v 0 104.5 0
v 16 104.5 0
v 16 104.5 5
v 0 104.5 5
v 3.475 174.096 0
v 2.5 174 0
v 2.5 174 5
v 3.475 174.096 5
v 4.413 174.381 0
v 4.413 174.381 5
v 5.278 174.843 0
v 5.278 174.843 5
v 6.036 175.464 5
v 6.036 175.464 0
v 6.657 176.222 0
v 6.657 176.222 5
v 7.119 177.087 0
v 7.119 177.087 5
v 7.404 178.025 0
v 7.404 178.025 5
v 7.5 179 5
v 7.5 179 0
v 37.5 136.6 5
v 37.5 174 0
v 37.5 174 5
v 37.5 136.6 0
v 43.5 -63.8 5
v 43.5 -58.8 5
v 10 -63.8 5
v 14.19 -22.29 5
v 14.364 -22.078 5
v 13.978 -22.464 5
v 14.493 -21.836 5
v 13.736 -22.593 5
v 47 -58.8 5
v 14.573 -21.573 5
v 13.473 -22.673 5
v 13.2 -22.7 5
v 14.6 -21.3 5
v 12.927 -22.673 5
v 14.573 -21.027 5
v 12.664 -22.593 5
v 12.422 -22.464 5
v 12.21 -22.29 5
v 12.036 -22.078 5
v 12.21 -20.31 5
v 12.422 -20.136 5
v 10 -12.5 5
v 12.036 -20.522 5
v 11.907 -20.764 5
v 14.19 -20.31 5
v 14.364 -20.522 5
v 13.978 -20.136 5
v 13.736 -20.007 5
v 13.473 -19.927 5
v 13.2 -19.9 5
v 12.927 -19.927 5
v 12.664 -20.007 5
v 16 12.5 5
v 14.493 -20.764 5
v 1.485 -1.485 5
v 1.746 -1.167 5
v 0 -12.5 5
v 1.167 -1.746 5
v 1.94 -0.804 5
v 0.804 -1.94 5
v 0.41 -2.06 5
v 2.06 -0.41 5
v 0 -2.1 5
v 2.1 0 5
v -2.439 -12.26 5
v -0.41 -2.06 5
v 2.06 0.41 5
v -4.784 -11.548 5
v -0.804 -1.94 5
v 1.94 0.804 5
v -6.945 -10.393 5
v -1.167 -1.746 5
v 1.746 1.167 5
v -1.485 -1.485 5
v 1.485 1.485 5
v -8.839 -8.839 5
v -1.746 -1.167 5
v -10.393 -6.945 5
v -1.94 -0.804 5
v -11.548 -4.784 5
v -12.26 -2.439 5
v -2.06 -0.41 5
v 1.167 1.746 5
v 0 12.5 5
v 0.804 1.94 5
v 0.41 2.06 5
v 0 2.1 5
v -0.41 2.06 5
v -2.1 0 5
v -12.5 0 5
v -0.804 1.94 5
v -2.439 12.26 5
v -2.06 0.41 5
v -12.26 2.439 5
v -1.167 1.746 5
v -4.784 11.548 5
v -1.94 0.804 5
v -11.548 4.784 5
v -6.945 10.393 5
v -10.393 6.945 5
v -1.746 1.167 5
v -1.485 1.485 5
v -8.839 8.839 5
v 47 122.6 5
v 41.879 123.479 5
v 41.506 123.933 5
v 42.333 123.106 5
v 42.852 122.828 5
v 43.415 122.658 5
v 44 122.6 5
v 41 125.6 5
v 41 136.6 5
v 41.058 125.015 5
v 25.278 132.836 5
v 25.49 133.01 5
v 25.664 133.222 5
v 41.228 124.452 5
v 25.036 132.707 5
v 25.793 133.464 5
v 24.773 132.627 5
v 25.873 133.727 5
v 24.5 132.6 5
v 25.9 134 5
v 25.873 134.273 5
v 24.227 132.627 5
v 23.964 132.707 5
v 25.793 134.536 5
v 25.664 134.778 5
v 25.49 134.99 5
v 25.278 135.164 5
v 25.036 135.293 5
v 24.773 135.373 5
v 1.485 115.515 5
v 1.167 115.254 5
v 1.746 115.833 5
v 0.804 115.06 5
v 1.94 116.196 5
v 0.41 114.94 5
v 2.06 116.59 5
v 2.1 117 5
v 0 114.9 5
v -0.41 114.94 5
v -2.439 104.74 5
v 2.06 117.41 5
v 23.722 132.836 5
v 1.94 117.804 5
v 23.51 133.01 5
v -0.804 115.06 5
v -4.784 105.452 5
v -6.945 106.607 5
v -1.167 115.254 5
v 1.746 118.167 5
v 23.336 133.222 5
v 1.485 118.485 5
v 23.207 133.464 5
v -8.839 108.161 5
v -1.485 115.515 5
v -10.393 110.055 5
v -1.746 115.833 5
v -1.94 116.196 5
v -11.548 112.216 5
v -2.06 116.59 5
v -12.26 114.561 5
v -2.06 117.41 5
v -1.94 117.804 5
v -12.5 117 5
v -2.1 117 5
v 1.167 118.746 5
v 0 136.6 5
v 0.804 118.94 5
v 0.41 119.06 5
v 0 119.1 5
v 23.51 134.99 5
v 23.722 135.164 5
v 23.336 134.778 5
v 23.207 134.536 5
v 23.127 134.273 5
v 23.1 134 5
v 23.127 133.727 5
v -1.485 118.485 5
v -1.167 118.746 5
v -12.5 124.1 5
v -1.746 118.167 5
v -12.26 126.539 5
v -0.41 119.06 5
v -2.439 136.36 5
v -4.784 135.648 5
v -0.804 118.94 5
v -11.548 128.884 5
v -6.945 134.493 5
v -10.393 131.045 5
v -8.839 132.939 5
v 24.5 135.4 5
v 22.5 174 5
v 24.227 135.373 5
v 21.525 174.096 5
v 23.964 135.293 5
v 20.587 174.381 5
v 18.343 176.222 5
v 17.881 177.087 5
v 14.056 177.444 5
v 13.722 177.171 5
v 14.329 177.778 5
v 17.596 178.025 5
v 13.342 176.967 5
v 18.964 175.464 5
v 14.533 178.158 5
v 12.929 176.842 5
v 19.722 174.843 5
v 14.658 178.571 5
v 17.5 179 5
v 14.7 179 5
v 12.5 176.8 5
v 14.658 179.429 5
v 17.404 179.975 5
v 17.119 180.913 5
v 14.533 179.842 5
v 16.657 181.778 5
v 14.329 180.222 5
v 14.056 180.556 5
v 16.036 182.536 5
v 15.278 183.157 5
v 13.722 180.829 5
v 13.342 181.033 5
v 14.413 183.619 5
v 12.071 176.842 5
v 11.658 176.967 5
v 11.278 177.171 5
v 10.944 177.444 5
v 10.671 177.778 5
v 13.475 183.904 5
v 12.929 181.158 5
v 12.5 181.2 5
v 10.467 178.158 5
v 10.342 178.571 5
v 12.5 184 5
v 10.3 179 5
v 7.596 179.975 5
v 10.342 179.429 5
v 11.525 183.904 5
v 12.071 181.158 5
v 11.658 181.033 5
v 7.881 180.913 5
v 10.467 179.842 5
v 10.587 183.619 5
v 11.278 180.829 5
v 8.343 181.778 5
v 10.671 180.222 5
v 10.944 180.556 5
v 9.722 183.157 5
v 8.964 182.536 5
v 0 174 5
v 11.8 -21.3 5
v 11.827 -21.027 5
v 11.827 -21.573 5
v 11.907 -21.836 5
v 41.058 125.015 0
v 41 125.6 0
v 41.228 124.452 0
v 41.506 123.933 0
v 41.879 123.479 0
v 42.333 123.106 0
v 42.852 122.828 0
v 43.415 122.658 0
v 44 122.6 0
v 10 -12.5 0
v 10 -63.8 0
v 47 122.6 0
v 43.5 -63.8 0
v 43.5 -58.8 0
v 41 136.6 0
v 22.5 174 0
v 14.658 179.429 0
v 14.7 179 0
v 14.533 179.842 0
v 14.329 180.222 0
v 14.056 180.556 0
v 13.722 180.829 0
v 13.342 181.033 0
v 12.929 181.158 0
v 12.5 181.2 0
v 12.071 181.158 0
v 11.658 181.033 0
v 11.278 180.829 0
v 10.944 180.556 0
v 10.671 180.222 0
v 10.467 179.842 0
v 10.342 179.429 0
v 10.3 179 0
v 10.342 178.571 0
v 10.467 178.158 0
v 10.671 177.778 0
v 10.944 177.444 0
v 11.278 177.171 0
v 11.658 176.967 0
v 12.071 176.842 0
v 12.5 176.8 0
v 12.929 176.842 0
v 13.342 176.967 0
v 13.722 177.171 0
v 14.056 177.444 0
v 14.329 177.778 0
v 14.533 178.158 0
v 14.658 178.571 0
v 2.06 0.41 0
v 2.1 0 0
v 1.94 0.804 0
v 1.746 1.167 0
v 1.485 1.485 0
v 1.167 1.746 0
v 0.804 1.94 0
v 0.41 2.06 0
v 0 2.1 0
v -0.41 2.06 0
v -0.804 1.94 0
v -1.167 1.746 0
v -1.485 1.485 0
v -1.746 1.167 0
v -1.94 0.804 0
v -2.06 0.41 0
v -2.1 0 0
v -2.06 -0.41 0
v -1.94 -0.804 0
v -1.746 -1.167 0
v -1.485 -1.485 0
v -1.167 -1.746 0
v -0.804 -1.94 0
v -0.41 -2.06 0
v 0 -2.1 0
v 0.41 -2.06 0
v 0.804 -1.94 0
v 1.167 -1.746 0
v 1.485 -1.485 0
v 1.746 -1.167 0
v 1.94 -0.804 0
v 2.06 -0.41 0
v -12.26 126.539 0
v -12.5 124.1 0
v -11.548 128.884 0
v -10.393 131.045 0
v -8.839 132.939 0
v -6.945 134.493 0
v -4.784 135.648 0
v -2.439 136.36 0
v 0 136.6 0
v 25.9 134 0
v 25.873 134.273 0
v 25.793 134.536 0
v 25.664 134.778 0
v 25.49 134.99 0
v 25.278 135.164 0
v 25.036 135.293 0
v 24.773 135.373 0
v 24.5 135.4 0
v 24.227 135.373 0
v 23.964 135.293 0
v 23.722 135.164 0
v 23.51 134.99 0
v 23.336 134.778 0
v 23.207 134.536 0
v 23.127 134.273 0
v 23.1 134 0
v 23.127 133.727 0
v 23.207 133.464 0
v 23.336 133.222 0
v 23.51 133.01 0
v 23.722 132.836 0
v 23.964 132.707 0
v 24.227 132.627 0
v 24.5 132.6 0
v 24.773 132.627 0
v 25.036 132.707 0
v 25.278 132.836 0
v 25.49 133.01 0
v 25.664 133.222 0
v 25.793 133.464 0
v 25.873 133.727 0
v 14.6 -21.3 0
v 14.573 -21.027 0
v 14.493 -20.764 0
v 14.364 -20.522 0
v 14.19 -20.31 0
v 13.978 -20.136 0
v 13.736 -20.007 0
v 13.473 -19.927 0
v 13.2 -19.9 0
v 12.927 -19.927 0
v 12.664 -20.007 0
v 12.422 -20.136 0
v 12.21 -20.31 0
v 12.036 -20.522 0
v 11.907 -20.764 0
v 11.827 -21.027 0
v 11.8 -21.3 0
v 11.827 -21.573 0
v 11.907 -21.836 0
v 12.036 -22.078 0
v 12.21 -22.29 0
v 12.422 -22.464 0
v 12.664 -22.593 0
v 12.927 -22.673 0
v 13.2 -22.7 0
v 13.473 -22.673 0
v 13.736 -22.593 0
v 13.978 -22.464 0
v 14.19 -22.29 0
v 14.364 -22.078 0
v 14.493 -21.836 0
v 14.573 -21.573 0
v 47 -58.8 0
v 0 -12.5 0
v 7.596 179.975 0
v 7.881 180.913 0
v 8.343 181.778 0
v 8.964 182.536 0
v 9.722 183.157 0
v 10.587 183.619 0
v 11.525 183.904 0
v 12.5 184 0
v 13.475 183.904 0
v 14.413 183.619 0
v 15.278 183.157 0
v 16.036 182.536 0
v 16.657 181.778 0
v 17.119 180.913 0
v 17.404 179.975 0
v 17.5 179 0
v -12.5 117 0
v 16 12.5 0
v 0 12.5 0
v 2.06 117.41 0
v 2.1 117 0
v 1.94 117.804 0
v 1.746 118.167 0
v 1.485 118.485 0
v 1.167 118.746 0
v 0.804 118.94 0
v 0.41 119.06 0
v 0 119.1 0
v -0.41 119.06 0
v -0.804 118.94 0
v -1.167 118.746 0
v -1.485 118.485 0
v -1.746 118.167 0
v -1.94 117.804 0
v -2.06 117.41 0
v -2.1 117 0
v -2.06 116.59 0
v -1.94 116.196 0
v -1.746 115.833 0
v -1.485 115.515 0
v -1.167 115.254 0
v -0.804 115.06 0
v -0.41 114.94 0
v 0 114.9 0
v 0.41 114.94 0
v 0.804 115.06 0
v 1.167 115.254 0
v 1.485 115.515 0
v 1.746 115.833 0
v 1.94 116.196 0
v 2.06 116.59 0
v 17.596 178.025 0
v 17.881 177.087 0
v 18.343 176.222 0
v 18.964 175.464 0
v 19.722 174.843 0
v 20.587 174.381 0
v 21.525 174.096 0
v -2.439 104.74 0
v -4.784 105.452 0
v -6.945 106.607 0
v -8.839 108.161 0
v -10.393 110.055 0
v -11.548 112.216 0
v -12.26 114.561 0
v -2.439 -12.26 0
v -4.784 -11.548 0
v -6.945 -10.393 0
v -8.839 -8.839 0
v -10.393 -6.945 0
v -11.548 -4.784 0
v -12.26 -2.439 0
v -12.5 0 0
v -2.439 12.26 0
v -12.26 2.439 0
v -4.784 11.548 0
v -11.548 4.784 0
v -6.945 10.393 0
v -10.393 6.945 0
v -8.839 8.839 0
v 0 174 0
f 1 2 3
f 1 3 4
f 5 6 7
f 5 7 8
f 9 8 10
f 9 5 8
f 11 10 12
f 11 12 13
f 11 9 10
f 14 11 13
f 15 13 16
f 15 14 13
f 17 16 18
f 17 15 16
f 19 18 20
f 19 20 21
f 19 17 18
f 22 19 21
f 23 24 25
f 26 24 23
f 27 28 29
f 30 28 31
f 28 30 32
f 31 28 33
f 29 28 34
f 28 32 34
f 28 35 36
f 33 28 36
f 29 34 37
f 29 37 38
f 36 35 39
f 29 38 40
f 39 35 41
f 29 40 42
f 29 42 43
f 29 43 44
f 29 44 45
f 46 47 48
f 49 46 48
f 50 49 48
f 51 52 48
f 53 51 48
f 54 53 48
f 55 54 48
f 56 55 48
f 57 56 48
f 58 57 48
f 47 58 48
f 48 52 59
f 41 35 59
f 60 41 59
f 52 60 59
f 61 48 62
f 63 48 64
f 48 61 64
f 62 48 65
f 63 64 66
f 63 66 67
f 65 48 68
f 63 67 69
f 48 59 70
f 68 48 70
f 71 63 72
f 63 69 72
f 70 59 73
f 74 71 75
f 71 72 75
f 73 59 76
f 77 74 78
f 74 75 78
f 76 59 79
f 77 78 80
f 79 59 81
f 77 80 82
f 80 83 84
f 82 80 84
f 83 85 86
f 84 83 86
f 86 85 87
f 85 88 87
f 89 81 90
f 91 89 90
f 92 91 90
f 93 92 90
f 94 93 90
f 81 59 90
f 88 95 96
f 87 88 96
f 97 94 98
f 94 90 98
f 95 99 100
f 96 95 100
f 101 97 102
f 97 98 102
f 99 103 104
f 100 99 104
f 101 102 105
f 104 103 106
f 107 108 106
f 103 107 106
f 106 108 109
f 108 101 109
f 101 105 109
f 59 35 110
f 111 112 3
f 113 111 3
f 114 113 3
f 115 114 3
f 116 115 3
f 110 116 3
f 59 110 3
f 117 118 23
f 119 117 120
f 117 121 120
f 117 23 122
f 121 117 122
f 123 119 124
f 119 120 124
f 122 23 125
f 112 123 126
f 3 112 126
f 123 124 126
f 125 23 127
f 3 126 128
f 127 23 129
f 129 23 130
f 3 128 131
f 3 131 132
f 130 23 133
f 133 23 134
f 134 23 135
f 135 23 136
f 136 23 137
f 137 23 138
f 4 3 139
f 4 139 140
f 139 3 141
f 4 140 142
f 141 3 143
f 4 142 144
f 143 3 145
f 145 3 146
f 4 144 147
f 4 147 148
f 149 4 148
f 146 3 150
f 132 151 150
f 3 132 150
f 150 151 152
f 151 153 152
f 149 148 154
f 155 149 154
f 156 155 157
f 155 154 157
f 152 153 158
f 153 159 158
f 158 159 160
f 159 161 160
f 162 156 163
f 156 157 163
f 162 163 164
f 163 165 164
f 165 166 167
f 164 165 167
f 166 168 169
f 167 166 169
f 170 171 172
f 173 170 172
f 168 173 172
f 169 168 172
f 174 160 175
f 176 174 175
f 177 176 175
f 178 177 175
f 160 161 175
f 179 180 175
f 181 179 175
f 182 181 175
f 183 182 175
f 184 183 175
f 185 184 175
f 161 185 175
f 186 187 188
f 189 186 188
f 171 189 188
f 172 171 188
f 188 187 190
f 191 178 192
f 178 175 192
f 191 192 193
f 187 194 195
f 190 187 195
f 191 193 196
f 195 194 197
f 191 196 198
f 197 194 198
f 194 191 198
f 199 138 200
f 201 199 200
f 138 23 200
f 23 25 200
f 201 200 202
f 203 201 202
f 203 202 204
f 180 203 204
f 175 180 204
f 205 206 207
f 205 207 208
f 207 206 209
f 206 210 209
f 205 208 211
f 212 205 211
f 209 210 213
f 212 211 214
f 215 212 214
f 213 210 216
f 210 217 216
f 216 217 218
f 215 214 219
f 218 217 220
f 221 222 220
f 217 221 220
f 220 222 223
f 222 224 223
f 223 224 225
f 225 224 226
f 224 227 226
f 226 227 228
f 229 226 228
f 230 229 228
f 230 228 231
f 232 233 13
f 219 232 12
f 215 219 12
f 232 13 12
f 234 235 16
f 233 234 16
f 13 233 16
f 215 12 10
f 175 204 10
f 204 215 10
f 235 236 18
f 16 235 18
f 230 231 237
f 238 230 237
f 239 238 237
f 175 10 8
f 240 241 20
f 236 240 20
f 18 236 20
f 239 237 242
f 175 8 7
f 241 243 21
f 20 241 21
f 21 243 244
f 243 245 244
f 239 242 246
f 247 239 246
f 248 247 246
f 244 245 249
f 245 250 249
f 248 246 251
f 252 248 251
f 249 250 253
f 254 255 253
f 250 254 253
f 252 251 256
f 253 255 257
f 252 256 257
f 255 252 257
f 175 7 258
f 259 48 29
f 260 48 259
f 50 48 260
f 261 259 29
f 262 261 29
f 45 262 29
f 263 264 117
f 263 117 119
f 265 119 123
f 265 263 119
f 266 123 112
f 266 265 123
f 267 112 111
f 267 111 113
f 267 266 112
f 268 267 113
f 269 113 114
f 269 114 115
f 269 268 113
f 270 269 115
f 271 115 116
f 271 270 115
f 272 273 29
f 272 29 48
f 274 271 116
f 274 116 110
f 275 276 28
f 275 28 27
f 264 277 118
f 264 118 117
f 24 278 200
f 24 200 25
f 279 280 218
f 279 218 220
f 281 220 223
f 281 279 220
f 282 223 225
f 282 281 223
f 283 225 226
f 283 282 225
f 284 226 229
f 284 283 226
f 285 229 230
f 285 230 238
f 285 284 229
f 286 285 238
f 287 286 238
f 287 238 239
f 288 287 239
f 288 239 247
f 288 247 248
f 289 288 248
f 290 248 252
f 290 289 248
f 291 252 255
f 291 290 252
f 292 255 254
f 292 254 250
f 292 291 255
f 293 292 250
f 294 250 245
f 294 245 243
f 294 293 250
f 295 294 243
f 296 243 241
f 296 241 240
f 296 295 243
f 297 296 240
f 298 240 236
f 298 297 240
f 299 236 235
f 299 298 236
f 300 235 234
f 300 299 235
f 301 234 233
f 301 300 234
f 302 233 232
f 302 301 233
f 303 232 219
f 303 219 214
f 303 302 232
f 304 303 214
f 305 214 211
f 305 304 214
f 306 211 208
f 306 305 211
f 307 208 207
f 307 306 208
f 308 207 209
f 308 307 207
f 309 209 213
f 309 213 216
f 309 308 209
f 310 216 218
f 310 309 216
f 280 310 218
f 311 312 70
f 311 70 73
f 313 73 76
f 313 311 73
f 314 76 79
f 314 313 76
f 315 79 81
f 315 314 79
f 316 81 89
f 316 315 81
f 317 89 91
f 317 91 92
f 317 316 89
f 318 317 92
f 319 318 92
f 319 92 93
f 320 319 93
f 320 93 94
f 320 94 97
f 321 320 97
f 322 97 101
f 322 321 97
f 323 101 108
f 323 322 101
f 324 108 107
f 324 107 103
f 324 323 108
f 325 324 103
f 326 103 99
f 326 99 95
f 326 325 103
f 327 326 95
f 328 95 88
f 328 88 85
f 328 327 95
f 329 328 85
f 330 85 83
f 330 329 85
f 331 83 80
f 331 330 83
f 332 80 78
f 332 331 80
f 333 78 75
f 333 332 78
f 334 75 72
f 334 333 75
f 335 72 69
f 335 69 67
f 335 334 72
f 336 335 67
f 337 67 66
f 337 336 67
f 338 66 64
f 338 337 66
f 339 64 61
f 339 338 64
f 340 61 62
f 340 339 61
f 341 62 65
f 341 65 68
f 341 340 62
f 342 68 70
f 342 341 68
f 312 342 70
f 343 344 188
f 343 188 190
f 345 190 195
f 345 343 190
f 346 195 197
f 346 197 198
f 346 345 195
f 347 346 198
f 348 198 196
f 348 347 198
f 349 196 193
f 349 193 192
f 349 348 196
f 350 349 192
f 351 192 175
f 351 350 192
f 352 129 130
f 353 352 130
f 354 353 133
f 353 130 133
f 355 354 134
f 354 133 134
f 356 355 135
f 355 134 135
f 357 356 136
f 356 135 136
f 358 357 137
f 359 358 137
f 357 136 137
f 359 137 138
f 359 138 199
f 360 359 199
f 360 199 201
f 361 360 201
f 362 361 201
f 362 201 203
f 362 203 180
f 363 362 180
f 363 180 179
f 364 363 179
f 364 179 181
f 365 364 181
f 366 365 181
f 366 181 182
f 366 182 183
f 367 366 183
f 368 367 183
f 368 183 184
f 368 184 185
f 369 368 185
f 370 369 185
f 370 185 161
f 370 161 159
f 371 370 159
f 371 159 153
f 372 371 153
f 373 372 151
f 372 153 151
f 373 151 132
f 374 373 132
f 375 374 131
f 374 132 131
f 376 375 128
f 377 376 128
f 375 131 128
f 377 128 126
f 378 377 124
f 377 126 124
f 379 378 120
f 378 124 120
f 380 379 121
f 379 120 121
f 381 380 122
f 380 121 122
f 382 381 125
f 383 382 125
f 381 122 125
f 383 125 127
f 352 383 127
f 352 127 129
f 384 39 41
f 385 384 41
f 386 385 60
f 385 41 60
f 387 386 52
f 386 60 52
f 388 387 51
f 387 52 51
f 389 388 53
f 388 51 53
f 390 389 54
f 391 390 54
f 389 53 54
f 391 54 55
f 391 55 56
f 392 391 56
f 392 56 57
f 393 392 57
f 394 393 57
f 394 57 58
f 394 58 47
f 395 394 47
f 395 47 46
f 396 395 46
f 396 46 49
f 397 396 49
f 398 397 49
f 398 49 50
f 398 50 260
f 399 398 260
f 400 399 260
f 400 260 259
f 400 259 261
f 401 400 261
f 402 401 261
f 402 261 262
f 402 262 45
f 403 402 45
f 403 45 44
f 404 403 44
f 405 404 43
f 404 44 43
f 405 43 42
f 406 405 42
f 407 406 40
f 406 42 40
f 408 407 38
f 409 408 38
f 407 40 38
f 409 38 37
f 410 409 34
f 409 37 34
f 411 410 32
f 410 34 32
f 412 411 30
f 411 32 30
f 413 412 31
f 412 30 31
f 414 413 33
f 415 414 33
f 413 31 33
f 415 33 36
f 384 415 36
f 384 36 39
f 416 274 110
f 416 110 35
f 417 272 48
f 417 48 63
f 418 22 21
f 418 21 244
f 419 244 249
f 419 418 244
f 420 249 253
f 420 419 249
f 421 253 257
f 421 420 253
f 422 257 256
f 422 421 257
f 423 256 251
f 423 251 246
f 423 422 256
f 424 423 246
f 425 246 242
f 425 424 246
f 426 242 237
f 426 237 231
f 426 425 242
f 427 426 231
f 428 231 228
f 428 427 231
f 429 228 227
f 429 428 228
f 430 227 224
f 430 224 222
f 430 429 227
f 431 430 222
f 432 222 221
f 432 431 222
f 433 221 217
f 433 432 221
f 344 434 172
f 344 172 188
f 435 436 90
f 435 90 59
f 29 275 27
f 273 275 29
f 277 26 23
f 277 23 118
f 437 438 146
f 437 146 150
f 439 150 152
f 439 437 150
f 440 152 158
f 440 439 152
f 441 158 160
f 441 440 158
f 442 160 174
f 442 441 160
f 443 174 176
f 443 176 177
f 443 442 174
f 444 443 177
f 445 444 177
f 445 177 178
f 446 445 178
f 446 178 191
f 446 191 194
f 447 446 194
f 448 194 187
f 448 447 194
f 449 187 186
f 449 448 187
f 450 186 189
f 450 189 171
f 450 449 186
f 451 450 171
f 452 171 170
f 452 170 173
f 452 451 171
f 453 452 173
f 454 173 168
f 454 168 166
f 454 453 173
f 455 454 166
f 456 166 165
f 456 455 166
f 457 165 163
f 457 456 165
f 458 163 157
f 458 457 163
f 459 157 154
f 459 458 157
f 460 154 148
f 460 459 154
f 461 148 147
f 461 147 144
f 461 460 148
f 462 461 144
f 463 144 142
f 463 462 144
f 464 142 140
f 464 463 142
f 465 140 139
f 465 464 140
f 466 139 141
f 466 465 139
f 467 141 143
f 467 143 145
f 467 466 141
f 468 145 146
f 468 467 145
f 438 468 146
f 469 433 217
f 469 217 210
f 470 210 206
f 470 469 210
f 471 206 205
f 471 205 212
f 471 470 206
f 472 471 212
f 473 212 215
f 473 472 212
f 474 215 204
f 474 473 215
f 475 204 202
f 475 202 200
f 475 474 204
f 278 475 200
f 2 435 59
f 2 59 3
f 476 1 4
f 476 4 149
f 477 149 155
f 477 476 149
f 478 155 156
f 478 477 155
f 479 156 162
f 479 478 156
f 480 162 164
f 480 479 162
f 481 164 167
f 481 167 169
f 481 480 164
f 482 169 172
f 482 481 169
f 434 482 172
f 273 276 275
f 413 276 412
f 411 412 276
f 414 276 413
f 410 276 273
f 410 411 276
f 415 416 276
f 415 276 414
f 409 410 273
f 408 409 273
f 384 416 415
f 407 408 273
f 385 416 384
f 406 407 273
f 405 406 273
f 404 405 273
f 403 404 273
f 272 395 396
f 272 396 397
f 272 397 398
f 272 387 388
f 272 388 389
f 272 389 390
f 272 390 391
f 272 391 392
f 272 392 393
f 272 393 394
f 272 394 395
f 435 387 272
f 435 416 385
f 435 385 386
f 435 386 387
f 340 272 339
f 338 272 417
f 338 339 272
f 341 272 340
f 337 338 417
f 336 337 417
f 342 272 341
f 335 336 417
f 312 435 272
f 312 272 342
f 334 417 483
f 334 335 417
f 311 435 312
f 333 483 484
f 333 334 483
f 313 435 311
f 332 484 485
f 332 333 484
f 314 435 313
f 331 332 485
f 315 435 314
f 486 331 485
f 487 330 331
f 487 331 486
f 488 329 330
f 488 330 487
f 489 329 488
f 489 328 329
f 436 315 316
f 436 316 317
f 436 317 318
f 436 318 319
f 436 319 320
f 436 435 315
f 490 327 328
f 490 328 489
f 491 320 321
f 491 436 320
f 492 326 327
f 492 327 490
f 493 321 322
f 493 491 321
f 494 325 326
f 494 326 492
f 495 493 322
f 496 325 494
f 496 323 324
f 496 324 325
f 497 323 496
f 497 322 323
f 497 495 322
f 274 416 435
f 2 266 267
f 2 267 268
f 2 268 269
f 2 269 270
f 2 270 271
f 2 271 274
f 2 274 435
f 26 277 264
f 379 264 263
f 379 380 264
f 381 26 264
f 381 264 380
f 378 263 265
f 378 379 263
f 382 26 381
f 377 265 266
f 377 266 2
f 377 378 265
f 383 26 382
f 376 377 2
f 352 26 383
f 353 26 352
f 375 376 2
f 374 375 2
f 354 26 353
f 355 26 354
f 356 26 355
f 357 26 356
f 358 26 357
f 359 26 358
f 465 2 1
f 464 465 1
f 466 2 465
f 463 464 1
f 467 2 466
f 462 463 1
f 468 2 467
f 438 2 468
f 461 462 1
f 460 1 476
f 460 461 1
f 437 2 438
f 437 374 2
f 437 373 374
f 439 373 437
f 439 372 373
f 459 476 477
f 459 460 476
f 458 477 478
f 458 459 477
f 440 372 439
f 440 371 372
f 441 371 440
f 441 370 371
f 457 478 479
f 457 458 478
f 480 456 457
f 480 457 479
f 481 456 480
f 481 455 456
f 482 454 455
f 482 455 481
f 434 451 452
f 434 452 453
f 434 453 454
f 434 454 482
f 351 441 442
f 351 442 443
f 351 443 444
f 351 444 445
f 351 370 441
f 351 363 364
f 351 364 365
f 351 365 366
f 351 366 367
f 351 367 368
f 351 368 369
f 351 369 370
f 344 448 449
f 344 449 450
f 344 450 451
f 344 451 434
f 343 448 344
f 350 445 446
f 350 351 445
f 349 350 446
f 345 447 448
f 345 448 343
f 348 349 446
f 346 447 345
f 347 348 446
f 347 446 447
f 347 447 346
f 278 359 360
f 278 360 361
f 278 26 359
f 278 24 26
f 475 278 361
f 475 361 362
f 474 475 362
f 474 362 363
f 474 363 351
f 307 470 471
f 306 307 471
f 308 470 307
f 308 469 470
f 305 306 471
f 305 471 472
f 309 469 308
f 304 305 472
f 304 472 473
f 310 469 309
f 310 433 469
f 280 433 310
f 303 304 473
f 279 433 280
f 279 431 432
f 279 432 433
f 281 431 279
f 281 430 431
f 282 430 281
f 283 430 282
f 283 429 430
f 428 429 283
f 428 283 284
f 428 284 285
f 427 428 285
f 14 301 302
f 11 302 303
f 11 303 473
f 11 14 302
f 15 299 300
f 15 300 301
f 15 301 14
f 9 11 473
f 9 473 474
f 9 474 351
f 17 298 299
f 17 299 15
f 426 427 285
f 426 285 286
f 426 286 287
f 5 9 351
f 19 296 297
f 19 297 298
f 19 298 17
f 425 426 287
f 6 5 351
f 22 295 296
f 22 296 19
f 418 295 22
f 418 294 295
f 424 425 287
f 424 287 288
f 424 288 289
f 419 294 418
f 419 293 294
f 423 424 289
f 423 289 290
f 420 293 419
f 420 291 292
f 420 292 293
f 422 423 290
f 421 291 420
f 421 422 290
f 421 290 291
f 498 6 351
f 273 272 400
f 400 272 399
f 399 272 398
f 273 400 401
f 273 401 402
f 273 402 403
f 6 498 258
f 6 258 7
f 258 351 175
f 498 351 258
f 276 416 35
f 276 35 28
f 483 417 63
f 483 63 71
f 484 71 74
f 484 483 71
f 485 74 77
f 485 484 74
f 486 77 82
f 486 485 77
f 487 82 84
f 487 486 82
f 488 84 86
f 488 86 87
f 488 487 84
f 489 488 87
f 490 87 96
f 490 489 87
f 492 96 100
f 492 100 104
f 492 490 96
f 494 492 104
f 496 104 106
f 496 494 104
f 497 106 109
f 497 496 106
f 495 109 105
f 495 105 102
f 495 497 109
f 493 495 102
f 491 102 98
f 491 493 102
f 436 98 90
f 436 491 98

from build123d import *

# Parameters (mm, degrees)
SKETCH1_R           = 2.1
SKETCH1_R_2         = 2.2
BOSS_EXTRUDE1_DEPTH = 5
SKETCH2_R           = 1.4
CUT_EXTRUDE1_DEPTH  = 6


with BuildPart() as part:
    # Sketch1 → Boss-Extrude1 (new body)
    with BuildSketch(Plane.XY):
        with BuildLine():
            Line((41, 136.6), (41, 125.6))
            ThreePointArc((41, 125.6), (41.878679656, 123.478679656), (44, 122.6))
            Line((44, 122.6), (47, 122.6))
            Line((47, 122.6), (47, -29.8))
            Line((47, -29.8), (47, -58.8))
            Line((47, -58.8), (43.5, -58.8))
            Line((43.5, -58.8), (43.5, -63.8))
            Line((43.5, -63.8), (10, -63.8))
            Line((10, -63.8), (10, -29.8))
            Line((10, -29.8), (10, -12.5))
            Line((10, -12.5), (0, -12.5))
            ThreePointArc((0, -12.5), (-12.5, 0), (0, 12.5))
            Line((0, 12.5), (16, 12.5))
            Line((16, 12.5), (16, 104.5))
            Line((16, 104.5), (0, 104.5))
            ThreePointArc((0, 104.5), (-8.838834765, 108.161165235), (-12.5, 117))
            Line((-12.5, 117), (-12.5, 124.1))
            ThreePointArc((-12.5, 124.1), (-8.838834765, 132.938834765), (0, 136.6))
            Line((0, 136.6), (0, 174))
            Line((0, 174), (2.5, 174))
            ThreePointArc((2.5, 174), (6.035533906, 175.464466094), (7.5, 179))
            ThreePointArc((7.5, 179), (12.5, 184), (17.5, 179))
            ThreePointArc((17.5, 179), (18.964466094, 175.464466094), (22.5, 174))
            Line((22.5, 174), (37.5, 174))
            Line((37.5, 174), (37.5, 136.6))
            Line((37.5, 136.6), (41, 136.6))
        make_face()
        Circle(SKETCH1_R, mode=Mode.SUBTRACT)
        with Locations((0, 117)):
            Circle(SKETCH1_R, mode=Mode.SUBTRACT)
        with Locations((12.5, 179)):
            Circle(SKETCH1_R_2, mode=Mode.SUBTRACT)
    extrude(amount=BOSS_EXTRUDE1_DEPTH)

    # Sketch2 → Cut-Extrude1 (cut, through all)
    with BuildSketch(Plane.XY.offset(5)):
        with Locations((13.2, -21.3)):
            Circle(SKETCH2_R)
        with Locations((24.5, 134)):
            Circle(SKETCH2_R)
    extrude(amount=-CUT_EXTRUDE1_DEPTH, mode=Mode.SUBTRACT)


solid = part.part
